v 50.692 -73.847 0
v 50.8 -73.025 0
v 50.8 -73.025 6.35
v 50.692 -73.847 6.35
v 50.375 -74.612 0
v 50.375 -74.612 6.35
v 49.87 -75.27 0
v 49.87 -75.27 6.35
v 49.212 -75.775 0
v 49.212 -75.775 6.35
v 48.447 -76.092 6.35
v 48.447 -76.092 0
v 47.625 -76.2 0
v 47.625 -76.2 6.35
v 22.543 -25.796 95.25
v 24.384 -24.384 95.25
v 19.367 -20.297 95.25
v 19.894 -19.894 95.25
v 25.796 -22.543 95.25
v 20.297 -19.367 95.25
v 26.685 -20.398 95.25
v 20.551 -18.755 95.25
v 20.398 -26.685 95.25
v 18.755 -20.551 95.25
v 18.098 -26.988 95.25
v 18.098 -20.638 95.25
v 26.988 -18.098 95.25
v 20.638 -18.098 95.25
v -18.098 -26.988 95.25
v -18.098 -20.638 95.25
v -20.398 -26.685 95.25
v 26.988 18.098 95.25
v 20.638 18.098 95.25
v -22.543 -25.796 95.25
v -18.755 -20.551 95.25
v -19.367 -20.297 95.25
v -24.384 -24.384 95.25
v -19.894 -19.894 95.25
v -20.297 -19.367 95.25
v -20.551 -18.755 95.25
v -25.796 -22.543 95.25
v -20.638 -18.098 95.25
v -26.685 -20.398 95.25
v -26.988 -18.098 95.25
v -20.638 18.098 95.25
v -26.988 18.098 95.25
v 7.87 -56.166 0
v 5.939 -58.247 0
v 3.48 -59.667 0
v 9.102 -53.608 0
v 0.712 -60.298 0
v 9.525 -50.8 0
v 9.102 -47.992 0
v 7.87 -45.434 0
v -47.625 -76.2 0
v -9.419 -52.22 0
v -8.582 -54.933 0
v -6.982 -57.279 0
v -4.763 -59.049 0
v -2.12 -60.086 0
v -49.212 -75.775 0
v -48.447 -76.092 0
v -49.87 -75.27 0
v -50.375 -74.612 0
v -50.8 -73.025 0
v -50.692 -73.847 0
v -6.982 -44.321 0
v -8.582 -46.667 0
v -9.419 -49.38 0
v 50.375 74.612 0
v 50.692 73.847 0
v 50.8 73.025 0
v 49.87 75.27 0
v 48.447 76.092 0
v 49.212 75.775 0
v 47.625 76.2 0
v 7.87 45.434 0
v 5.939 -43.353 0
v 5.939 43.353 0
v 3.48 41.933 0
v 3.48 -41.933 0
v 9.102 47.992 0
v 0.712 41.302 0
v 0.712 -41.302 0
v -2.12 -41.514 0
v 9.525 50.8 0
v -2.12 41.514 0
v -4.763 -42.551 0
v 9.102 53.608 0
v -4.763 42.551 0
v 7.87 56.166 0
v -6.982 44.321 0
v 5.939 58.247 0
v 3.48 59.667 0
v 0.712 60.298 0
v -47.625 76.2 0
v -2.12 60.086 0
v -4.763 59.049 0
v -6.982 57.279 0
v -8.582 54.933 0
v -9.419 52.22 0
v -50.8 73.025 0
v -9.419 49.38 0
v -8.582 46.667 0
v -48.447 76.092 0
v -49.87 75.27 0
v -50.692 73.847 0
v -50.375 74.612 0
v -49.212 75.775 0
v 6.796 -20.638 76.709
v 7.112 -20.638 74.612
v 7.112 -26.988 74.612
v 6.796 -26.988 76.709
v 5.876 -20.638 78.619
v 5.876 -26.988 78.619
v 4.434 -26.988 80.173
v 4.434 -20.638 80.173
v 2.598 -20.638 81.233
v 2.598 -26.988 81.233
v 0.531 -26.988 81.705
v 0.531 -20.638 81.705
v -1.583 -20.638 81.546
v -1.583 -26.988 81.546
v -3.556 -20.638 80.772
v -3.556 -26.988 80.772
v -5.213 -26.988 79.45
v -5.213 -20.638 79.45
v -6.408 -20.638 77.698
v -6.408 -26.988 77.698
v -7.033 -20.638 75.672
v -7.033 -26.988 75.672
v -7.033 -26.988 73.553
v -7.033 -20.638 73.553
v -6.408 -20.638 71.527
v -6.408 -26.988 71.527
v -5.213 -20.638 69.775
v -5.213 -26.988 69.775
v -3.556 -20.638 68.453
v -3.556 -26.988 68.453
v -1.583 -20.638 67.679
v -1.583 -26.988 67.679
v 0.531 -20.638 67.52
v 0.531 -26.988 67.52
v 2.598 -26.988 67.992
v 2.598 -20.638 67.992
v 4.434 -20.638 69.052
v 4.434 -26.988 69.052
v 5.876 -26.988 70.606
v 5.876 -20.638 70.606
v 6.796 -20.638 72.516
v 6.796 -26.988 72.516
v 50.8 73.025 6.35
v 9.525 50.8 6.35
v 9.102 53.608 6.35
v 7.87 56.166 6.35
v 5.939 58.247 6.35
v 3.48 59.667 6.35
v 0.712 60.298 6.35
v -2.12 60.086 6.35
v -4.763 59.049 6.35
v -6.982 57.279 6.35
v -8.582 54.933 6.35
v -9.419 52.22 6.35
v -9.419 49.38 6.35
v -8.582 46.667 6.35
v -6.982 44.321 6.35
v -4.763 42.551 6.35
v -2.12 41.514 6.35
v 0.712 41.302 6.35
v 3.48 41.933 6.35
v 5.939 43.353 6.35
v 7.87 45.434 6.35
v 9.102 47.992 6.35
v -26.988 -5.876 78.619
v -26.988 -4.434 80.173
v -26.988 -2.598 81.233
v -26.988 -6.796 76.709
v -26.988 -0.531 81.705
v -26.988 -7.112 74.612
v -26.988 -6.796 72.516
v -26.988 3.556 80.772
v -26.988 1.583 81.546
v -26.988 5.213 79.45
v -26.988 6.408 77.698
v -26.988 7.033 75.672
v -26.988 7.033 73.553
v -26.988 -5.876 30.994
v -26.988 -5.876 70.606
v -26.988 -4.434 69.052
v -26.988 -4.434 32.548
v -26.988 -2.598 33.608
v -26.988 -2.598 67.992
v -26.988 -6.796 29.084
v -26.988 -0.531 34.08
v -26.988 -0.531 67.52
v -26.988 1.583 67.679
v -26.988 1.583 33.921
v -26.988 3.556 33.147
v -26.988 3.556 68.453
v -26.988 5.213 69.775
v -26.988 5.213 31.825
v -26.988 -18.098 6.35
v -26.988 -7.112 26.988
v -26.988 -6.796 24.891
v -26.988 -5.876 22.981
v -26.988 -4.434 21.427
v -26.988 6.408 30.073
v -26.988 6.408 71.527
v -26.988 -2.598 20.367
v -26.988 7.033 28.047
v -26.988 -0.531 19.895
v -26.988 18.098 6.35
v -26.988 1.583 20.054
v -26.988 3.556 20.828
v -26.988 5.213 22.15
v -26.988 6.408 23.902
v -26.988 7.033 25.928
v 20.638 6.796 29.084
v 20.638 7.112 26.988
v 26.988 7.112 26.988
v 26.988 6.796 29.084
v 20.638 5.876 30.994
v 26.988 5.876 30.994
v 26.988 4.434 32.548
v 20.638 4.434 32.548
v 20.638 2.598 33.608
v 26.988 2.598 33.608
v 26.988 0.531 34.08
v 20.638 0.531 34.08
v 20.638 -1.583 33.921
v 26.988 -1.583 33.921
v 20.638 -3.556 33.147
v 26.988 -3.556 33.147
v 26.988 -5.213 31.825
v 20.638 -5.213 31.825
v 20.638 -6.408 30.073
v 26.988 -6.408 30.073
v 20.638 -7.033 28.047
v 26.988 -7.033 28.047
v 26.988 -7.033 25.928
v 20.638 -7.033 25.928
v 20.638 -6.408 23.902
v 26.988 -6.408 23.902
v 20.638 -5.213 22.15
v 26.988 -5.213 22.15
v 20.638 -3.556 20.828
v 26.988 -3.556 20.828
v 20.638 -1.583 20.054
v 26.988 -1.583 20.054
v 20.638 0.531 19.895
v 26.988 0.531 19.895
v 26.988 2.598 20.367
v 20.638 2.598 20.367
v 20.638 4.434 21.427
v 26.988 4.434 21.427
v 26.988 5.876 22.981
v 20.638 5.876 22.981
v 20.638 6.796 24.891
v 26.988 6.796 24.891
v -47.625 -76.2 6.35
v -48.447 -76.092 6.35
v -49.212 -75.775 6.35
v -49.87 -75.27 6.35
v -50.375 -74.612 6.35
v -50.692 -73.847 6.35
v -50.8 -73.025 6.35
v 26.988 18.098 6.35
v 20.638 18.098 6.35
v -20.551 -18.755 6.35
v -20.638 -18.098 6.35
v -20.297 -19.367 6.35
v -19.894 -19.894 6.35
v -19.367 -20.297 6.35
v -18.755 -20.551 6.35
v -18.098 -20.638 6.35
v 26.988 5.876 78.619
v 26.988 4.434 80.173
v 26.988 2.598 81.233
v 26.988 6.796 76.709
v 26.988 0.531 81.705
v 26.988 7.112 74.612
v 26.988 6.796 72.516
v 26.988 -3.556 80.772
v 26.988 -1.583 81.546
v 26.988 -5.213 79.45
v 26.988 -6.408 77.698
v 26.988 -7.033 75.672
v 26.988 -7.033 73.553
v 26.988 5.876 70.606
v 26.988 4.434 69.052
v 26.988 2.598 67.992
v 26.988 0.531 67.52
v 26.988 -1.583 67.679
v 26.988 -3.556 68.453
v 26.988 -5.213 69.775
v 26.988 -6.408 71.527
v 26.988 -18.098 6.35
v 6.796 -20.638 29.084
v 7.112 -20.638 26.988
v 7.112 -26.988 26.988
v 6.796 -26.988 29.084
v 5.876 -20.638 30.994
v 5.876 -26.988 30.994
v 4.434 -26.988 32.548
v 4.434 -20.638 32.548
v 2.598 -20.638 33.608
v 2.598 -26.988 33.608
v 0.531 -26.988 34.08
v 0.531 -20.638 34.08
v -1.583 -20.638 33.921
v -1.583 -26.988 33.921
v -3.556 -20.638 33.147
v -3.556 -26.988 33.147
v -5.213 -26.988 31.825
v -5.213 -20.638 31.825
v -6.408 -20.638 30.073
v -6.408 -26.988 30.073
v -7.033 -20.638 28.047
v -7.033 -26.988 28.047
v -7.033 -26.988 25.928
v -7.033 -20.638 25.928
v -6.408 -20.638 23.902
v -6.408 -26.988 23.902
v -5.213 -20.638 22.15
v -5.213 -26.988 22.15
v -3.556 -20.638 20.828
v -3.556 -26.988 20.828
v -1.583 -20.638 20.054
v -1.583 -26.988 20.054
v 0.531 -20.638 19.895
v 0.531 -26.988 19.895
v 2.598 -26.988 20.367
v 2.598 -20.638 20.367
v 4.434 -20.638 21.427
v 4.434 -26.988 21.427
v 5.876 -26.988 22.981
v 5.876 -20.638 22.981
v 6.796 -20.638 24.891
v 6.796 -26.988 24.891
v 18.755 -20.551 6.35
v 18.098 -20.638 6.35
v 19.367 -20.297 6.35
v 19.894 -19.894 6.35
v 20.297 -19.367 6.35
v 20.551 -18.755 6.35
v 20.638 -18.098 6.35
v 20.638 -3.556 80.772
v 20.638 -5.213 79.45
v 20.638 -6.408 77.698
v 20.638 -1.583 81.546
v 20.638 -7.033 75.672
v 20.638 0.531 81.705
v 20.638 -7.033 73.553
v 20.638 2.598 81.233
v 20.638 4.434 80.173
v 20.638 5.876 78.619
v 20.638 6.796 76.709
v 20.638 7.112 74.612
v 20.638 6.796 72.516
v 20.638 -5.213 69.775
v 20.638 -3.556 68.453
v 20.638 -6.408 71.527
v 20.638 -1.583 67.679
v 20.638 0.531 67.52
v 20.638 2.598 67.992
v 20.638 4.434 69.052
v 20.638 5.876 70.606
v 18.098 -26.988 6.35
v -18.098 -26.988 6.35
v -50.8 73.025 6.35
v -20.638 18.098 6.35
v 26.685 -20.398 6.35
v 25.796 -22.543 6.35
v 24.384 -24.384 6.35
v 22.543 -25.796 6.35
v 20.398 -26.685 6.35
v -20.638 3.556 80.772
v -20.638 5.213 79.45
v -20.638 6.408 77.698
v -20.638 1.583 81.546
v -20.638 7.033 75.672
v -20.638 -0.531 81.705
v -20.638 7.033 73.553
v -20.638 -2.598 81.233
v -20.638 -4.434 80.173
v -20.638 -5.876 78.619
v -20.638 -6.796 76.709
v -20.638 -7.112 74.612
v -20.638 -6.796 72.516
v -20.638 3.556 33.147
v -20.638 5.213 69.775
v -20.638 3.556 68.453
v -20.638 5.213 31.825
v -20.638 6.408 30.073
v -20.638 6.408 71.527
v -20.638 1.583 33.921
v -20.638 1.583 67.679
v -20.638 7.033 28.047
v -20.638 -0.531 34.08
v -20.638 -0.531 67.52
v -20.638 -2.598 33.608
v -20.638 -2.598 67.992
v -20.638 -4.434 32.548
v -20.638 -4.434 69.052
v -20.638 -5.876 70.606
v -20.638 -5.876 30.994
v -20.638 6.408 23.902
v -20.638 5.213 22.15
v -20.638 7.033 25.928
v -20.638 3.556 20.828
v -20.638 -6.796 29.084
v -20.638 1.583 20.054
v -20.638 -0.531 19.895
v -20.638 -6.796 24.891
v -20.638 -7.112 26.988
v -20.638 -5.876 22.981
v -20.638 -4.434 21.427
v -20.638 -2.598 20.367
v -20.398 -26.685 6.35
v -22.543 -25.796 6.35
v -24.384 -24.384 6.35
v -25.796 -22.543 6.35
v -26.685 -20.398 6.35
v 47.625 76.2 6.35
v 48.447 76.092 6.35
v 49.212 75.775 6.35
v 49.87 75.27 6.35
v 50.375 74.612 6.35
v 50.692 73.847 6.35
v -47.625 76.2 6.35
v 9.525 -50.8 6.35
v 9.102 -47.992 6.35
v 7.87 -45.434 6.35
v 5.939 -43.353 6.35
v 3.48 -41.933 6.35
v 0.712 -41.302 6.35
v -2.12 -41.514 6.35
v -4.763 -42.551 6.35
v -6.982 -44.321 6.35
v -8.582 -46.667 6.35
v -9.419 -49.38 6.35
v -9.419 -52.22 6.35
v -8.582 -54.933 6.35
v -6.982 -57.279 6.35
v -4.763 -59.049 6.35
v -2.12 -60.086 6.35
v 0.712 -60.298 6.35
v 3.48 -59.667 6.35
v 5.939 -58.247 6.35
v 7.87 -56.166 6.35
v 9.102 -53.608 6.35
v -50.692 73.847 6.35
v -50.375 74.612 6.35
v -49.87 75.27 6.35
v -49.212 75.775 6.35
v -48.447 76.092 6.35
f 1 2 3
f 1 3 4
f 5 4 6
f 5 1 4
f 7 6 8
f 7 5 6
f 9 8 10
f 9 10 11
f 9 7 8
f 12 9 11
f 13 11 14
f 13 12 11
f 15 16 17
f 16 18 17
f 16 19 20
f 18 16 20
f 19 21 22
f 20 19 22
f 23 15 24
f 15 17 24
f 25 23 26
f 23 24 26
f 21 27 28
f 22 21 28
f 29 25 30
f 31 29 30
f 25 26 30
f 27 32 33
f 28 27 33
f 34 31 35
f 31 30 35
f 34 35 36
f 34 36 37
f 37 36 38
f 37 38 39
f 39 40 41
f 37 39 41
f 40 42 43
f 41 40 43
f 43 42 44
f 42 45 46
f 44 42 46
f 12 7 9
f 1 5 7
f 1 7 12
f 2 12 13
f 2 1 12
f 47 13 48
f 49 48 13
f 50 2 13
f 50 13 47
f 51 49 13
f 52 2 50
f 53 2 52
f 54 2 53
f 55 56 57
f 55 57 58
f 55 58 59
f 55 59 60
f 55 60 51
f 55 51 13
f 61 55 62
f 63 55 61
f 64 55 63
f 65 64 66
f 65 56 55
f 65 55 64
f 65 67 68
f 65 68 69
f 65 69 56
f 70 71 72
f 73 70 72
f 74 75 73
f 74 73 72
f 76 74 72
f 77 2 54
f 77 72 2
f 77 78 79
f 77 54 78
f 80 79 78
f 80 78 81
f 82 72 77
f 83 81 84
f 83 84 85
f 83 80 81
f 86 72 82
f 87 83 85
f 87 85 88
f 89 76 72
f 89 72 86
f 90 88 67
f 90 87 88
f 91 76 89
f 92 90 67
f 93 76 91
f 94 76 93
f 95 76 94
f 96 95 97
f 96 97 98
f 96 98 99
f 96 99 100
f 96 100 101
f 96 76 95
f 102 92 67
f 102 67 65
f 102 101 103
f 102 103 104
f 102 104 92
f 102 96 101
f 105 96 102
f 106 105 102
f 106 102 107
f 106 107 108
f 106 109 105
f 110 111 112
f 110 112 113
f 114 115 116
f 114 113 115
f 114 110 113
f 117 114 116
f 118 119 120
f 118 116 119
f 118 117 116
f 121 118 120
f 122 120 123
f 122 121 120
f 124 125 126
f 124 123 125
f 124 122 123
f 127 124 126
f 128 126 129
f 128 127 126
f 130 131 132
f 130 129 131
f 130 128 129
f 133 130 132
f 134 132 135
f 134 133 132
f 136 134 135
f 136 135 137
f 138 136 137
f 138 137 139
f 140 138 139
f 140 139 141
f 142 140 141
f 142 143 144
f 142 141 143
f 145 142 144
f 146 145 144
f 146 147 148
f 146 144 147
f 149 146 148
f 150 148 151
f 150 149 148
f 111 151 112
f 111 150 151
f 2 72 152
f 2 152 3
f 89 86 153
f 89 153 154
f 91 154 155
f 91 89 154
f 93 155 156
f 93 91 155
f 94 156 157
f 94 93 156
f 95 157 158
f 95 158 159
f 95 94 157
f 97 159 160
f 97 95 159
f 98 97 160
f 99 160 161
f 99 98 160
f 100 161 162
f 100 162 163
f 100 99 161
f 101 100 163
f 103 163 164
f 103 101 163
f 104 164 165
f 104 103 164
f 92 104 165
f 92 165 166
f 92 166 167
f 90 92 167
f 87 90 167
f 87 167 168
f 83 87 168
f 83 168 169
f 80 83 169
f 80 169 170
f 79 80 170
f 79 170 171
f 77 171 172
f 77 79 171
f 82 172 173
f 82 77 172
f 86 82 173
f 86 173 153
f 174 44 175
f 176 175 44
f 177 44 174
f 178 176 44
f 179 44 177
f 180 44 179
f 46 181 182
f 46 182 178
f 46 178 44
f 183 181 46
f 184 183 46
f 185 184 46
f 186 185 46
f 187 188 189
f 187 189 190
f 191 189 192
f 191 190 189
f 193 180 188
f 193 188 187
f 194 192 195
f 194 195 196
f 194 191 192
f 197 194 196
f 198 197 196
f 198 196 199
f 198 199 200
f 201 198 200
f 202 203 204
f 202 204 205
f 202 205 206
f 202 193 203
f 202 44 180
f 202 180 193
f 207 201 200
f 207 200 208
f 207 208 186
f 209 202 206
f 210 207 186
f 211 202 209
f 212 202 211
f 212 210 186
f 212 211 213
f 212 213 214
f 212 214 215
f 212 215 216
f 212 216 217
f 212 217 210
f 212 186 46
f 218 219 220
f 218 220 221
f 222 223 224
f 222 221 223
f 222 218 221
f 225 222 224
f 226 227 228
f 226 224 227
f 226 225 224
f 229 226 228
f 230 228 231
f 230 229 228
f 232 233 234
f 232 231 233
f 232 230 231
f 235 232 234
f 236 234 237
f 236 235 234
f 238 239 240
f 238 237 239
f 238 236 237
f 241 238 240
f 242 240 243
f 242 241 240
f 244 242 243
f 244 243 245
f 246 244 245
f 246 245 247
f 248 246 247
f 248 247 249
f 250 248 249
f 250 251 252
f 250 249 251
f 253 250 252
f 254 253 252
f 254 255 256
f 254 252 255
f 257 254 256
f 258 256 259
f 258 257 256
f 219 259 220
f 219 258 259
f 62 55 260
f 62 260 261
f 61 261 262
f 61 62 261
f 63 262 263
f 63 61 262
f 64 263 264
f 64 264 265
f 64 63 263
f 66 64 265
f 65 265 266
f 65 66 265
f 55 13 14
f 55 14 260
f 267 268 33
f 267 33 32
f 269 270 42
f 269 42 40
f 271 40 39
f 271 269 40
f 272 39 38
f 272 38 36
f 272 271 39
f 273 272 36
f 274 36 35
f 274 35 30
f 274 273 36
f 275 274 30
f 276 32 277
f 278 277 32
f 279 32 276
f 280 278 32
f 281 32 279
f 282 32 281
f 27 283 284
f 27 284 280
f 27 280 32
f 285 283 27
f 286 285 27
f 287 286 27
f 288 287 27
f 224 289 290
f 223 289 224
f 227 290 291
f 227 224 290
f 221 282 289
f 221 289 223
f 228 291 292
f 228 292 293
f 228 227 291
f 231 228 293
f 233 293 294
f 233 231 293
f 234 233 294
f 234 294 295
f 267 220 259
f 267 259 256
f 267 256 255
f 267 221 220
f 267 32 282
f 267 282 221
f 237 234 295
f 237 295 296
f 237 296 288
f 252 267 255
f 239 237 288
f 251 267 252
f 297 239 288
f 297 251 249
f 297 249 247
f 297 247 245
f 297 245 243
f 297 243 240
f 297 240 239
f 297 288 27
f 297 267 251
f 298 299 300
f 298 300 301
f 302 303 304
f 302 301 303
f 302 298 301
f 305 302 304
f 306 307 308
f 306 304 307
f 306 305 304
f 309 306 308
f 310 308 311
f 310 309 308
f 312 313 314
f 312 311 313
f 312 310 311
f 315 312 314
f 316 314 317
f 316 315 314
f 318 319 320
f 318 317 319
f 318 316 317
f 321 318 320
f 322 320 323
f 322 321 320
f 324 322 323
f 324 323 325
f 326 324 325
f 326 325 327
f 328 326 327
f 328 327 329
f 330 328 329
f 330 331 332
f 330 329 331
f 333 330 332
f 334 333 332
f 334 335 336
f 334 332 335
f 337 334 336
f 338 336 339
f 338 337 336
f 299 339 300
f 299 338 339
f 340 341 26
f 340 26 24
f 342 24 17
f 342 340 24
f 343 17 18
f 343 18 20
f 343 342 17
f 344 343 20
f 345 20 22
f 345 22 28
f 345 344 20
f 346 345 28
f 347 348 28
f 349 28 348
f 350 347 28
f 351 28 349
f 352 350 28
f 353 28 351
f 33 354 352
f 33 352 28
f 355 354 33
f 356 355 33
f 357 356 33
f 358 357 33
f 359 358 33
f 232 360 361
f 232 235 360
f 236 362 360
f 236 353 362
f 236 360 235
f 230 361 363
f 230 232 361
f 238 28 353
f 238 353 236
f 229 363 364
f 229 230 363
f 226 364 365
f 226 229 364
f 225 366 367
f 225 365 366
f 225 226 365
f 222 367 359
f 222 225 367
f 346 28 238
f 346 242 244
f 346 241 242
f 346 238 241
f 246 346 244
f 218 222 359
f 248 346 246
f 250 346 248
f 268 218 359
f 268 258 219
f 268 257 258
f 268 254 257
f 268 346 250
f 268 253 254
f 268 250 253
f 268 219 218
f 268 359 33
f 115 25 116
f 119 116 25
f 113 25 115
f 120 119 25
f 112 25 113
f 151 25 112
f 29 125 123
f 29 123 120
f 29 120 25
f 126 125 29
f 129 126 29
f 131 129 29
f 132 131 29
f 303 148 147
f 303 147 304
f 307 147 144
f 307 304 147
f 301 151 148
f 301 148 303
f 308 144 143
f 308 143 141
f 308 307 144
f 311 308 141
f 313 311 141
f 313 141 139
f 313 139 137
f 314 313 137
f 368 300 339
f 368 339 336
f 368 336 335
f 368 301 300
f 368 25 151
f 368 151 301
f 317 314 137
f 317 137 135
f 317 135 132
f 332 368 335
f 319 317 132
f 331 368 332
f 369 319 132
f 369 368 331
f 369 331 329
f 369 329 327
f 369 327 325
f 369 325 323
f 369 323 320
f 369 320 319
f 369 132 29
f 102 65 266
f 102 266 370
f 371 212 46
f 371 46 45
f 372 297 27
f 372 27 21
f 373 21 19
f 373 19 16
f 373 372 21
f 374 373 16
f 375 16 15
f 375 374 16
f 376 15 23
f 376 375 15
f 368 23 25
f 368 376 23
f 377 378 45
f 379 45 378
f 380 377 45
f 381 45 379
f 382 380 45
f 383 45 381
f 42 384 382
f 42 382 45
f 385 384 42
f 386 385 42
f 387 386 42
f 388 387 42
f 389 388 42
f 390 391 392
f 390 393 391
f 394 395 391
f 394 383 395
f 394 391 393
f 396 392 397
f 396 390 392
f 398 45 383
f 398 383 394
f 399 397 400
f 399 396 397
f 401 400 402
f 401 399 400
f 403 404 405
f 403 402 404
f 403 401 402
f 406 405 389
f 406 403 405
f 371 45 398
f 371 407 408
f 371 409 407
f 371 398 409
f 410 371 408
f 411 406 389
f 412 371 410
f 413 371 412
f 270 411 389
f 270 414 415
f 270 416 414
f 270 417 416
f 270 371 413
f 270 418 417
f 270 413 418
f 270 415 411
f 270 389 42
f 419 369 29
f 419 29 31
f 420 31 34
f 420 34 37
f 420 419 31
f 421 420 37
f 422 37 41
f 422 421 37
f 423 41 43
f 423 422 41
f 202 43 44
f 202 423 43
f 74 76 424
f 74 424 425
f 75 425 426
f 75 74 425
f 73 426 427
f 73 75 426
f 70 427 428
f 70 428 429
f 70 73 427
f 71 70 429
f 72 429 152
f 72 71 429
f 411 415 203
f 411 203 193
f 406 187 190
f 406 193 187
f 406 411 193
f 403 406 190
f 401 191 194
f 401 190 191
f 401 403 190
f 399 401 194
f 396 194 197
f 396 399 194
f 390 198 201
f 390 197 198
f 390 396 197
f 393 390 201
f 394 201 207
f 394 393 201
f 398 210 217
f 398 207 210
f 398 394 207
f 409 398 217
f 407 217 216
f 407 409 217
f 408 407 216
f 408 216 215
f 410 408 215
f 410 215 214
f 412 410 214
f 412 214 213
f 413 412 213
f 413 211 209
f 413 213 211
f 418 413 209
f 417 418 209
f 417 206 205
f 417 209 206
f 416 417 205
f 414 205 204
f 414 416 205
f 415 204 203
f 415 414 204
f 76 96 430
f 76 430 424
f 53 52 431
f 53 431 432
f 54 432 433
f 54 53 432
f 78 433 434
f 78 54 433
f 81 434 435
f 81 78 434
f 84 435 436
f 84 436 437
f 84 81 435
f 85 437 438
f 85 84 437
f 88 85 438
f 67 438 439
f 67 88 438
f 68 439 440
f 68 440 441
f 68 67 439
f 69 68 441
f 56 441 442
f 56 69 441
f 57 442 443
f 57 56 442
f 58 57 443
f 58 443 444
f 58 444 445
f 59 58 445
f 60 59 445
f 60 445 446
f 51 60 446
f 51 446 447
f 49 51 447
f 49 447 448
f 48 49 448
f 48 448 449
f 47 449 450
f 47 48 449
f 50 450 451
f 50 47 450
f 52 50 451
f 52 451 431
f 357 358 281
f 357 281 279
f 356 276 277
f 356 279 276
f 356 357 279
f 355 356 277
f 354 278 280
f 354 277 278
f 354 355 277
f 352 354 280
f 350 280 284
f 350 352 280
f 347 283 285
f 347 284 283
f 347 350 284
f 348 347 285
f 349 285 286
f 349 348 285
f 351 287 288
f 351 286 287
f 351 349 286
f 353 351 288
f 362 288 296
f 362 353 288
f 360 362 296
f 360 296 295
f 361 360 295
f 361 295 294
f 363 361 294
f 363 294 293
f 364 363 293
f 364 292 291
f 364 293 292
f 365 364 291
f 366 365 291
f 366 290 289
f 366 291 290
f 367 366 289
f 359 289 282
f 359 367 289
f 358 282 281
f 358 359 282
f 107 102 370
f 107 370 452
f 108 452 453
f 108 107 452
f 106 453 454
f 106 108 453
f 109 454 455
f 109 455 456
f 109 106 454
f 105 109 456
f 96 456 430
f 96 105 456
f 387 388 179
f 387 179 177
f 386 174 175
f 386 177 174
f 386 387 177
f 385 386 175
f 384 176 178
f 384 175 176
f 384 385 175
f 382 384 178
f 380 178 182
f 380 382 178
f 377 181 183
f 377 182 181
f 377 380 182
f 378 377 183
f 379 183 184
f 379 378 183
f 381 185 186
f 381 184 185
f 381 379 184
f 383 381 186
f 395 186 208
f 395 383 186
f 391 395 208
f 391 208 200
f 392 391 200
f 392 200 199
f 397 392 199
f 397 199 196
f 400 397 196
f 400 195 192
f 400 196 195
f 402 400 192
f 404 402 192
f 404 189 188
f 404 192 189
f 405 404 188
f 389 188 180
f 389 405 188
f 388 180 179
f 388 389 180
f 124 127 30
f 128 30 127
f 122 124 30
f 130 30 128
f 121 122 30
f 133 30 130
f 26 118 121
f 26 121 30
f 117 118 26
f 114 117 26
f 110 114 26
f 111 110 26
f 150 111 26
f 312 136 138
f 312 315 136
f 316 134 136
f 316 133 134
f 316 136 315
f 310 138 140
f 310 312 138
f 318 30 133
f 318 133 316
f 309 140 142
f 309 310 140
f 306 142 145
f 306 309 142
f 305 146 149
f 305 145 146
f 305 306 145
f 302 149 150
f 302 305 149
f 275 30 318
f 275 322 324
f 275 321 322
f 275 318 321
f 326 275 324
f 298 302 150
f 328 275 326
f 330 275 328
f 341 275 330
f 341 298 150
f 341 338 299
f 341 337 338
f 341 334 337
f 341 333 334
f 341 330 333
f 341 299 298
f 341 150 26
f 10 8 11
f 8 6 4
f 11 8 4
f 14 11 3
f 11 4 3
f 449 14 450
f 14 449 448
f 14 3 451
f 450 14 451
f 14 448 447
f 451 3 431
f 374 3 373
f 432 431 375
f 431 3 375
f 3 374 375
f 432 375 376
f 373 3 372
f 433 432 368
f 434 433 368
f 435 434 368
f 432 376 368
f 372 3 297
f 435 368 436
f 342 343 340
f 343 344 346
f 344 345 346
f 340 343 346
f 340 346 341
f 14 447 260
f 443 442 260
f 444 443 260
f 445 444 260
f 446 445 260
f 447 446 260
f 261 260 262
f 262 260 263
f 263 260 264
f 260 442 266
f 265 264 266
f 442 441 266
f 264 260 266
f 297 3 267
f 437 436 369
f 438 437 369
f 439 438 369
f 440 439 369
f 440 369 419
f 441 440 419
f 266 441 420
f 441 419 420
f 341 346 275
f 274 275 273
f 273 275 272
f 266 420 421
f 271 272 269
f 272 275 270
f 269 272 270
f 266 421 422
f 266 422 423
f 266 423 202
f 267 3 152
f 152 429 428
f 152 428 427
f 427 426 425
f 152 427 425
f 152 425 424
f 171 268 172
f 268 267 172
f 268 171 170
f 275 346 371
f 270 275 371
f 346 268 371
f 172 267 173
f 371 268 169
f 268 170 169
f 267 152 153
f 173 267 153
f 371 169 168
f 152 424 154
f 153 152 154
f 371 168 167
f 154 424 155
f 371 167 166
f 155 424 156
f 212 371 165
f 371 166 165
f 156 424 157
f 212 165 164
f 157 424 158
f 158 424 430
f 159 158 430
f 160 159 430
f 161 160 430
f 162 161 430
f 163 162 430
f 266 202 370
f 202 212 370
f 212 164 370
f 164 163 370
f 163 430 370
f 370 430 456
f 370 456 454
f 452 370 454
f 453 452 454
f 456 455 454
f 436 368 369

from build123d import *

# Parameters (mm, degrees)
SKETCH1_R           = 9.525
BOSS_EXTRUDE1_DEPTH = 6.35
EXTRUDE_THIN1_DEPTH = 88.9
SKETCH3_R           = 7.112
CUT_EXTRUDE1_DEPTH  = 77.2
CIRPATTERN1_COUNT   = 4


with BuildPart() as part:
    # Sketch1 → Boss-Extrude1 (new body)
    with BuildSketch(Plane.XY):
        with BuildLine():
            Line((-47.625, 76.2), (47.625, 76.2))
            ThreePointArc((47.625, 76.2), (49.87006403, 75.27006403), (50.8, 73.025))
            Line((50.8, 73.025), (50.8, -73.025))
            ThreePointArc((50.8, -73.025), (49.87006403, -75.27006403), (47.625, -76.2))
            Line((47.625, -76.2), (-47.625, -76.2))
            ThreePointArc((-47.625, -76.2), (-49.87006403, -75.27006403), (-50.8, -73.025))
            Line((-50.8, -73.025), (-50.8, 73.025))
            ThreePointArc((-50.8, 73.025), (-49.87006403, 75.27006403), (-47.625, 76.2))
        make_face()
        with Locations((0, 50.8)):
            Circle(SKETCH1_R, mode=Mode.SUBTRACT)
        with Locations((0, -50.8)):
            Circle(SKETCH1_R, mode=Mode.SUBTRACT)
    extrude(amount=BOSS_EXTRUDE1_DEPTH)

    # Sketch2 → Extrude-Thin1 (add)
    with BuildSketch(Plane.XY.offset(6.35)):
        with BuildLine():
            Line((-20.6375, 18.0975), (-20.6375, -18.0975))
            ThreePointArc((-20.6375, -18.0975), (-19.893551224, -19.893551224), (-18.0975, -20.6375))
            Line((-18.0975, -20.6375), (18.0975, -20.6375))
            ThreePointArc((18.0975, -20.6375), (19.893551224, -19.893551224), (20.6375, -18.0975))
            Line((20.6375, -18.0975), (20.6375, 18.0975))
            Line((20.6375, 18.0975), (26.9875, 18.0975))
            Line((26.9875, 18.0975), (26.9875, -18.0975))
            ThreePointArc((26.9875, -18.0975), (24.383679285, -24.383679285), (18.0975, -26.9875))
            Line((18.0975, -26.9875), (-18.0975, -26.9875))
            ThreePointArc((-18.0975, -26.9875), (-24.383679285, -24.383679285), (-26.9875, -18.0975))
            Line((-26.9875, -18.0975), (-26.9875, 18.0975))
            Line((-26.9875, 18.0975), (-20.6375, 18.0975))
        make_face()
    extrude(amount=EXTRUDE_THIN1_DEPTH)

    # Sketch3 → Cut-Extrude1 (cut, through all)
    with BuildSketch(Plane.XZ):
        with Locations((0, 74.6125)):
            Circle(SKETCH3_R)
        with Locations((0, 26.9875)):
            Circle(SKETCH3_R)
    cut_extrude1 = extrude(amount=CUT_EXTRUDE1_DEPTH, mode=Mode.SUBTRACT)

    # CirPattern1: Cut-Extrude1 ×4 about axis, 1 skipped
    cirpattern1_axis = Axis((0, 0, 74.6125), (0, 0, -1))
    add([cut_extrude1.rotate(cirpattern1_axis, i * 360 / CIRPATTERN1_COUNT) for i in range(1, CIRPATTERN1_COUNT) if i not in (2,)], mode=Mode.SUBTRACT)


solid = part.part
